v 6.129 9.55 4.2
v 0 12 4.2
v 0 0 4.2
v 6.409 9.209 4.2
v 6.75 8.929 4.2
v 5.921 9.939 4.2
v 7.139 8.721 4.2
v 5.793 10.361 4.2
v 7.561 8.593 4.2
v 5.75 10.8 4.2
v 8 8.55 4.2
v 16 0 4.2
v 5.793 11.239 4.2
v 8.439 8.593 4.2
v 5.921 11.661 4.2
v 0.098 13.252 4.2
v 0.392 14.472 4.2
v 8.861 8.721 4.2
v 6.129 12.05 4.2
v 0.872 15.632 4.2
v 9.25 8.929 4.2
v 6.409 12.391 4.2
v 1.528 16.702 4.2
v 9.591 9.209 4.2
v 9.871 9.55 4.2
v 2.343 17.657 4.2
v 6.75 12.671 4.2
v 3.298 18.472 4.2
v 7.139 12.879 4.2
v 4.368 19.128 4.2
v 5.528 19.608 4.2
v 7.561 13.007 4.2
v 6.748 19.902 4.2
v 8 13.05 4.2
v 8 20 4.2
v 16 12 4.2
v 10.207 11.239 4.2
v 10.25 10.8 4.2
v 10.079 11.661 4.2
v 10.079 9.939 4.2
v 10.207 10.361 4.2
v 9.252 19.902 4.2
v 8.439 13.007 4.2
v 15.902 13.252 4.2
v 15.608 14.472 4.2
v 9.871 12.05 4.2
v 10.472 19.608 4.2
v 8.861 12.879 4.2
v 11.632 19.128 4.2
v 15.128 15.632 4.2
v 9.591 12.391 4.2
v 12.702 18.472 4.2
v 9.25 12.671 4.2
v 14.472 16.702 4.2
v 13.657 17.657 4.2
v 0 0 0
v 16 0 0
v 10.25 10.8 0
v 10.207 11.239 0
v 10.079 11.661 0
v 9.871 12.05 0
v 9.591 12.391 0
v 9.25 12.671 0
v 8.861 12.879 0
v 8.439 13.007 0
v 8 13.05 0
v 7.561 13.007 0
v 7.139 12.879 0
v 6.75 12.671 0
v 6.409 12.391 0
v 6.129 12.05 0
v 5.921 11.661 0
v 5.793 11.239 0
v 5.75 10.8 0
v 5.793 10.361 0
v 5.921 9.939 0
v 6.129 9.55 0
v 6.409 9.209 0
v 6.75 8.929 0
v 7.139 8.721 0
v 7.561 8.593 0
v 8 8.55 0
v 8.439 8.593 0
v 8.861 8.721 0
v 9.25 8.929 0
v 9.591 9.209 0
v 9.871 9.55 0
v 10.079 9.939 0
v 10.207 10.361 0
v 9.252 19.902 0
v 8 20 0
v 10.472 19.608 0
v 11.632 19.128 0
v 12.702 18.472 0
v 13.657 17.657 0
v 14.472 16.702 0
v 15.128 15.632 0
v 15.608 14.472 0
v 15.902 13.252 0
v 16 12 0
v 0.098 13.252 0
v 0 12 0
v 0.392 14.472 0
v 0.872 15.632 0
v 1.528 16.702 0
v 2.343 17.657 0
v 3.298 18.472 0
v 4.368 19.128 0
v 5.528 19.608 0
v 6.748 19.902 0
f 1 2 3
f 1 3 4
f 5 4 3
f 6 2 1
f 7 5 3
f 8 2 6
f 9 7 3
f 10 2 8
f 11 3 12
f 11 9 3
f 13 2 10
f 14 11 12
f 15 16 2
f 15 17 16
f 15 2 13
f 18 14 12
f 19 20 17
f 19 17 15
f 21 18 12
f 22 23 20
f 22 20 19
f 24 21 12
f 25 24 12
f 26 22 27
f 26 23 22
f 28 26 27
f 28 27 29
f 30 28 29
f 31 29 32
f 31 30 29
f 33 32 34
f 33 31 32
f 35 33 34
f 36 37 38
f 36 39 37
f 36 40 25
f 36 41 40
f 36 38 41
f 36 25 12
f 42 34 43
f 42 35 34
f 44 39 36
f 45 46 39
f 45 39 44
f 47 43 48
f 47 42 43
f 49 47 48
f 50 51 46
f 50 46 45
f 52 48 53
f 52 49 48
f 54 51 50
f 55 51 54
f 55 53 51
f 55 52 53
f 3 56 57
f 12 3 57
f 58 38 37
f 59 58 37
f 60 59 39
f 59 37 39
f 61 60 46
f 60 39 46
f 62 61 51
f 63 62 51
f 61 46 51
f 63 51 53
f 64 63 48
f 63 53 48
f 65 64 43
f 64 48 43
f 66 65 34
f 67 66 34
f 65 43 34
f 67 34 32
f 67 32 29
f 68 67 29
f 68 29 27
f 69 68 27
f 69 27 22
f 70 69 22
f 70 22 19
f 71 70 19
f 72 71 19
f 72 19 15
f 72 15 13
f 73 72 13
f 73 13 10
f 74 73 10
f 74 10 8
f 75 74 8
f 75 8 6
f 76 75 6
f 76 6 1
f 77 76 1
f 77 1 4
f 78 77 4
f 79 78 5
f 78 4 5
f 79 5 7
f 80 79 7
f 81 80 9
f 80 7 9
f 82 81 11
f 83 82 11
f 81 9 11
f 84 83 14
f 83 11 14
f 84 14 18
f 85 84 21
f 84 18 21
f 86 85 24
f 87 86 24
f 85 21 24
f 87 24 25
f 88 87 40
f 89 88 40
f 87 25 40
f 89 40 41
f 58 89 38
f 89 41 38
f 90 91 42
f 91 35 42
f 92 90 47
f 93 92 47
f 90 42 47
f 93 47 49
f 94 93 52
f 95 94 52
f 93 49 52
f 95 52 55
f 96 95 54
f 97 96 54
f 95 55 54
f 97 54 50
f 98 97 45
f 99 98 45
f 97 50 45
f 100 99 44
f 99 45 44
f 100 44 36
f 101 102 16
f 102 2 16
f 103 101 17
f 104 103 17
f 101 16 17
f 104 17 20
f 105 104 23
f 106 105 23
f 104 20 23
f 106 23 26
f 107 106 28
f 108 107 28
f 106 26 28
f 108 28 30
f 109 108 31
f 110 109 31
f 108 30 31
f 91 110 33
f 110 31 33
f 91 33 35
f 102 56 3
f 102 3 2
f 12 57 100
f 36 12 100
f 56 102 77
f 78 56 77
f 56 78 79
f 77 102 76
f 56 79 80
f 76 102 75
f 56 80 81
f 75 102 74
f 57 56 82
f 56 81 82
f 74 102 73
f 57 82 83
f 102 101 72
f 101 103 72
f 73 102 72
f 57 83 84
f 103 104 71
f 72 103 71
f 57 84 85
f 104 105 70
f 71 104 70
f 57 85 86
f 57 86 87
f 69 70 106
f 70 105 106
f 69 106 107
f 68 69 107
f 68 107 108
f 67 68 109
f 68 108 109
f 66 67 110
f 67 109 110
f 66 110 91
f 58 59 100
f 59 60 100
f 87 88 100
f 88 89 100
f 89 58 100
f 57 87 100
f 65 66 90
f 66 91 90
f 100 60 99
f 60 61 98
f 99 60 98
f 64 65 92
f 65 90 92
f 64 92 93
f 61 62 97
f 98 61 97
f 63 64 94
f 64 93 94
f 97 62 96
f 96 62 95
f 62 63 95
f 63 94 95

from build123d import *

# Parameters (mm, degrees)
SKETCH1_W           = 16
SKETCH1_H           = 20
BOSS_EXTRUDE1_DEPTH = 4.2
SKETCH2_R           = 2.25
CUT_EXTRUDE1_DEPTH  = 26.954575704
FILLET1_R           = 8


with BuildPart() as part:
    # Sketch1 → Boss-Extrude1 (new body)
    with BuildSketch(Plane.XY):
        with Locations((8, 10)):
            Rectangle(SKETCH1_W, SKETCH1_H)
    extrude(amount=BOSS_EXTRUDE1_DEPTH)

    # Sketch2 → Cut-Extrude1 (cut, through all)
    with BuildSketch(Plane.XY.offset(4.2)):
        with Locations((8, 10.8)):
            Circle(SKETCH2_R)
    extrude(amount=-CUT_EXTRUDE1_DEPTH, mode=Mode.SUBTRACT)

    # Fillet1
    fillet1_edges = [part.edges().sort_by_distance(p)[0] for p in [
        (16, 20, 2.1),
        (0, 20, 2.1),
    ]]
    fillet(fillet1_edges, radius=FILLET1_R - 0.0001)  # a hair under: the kernel refuses the full size


solid = part.part
